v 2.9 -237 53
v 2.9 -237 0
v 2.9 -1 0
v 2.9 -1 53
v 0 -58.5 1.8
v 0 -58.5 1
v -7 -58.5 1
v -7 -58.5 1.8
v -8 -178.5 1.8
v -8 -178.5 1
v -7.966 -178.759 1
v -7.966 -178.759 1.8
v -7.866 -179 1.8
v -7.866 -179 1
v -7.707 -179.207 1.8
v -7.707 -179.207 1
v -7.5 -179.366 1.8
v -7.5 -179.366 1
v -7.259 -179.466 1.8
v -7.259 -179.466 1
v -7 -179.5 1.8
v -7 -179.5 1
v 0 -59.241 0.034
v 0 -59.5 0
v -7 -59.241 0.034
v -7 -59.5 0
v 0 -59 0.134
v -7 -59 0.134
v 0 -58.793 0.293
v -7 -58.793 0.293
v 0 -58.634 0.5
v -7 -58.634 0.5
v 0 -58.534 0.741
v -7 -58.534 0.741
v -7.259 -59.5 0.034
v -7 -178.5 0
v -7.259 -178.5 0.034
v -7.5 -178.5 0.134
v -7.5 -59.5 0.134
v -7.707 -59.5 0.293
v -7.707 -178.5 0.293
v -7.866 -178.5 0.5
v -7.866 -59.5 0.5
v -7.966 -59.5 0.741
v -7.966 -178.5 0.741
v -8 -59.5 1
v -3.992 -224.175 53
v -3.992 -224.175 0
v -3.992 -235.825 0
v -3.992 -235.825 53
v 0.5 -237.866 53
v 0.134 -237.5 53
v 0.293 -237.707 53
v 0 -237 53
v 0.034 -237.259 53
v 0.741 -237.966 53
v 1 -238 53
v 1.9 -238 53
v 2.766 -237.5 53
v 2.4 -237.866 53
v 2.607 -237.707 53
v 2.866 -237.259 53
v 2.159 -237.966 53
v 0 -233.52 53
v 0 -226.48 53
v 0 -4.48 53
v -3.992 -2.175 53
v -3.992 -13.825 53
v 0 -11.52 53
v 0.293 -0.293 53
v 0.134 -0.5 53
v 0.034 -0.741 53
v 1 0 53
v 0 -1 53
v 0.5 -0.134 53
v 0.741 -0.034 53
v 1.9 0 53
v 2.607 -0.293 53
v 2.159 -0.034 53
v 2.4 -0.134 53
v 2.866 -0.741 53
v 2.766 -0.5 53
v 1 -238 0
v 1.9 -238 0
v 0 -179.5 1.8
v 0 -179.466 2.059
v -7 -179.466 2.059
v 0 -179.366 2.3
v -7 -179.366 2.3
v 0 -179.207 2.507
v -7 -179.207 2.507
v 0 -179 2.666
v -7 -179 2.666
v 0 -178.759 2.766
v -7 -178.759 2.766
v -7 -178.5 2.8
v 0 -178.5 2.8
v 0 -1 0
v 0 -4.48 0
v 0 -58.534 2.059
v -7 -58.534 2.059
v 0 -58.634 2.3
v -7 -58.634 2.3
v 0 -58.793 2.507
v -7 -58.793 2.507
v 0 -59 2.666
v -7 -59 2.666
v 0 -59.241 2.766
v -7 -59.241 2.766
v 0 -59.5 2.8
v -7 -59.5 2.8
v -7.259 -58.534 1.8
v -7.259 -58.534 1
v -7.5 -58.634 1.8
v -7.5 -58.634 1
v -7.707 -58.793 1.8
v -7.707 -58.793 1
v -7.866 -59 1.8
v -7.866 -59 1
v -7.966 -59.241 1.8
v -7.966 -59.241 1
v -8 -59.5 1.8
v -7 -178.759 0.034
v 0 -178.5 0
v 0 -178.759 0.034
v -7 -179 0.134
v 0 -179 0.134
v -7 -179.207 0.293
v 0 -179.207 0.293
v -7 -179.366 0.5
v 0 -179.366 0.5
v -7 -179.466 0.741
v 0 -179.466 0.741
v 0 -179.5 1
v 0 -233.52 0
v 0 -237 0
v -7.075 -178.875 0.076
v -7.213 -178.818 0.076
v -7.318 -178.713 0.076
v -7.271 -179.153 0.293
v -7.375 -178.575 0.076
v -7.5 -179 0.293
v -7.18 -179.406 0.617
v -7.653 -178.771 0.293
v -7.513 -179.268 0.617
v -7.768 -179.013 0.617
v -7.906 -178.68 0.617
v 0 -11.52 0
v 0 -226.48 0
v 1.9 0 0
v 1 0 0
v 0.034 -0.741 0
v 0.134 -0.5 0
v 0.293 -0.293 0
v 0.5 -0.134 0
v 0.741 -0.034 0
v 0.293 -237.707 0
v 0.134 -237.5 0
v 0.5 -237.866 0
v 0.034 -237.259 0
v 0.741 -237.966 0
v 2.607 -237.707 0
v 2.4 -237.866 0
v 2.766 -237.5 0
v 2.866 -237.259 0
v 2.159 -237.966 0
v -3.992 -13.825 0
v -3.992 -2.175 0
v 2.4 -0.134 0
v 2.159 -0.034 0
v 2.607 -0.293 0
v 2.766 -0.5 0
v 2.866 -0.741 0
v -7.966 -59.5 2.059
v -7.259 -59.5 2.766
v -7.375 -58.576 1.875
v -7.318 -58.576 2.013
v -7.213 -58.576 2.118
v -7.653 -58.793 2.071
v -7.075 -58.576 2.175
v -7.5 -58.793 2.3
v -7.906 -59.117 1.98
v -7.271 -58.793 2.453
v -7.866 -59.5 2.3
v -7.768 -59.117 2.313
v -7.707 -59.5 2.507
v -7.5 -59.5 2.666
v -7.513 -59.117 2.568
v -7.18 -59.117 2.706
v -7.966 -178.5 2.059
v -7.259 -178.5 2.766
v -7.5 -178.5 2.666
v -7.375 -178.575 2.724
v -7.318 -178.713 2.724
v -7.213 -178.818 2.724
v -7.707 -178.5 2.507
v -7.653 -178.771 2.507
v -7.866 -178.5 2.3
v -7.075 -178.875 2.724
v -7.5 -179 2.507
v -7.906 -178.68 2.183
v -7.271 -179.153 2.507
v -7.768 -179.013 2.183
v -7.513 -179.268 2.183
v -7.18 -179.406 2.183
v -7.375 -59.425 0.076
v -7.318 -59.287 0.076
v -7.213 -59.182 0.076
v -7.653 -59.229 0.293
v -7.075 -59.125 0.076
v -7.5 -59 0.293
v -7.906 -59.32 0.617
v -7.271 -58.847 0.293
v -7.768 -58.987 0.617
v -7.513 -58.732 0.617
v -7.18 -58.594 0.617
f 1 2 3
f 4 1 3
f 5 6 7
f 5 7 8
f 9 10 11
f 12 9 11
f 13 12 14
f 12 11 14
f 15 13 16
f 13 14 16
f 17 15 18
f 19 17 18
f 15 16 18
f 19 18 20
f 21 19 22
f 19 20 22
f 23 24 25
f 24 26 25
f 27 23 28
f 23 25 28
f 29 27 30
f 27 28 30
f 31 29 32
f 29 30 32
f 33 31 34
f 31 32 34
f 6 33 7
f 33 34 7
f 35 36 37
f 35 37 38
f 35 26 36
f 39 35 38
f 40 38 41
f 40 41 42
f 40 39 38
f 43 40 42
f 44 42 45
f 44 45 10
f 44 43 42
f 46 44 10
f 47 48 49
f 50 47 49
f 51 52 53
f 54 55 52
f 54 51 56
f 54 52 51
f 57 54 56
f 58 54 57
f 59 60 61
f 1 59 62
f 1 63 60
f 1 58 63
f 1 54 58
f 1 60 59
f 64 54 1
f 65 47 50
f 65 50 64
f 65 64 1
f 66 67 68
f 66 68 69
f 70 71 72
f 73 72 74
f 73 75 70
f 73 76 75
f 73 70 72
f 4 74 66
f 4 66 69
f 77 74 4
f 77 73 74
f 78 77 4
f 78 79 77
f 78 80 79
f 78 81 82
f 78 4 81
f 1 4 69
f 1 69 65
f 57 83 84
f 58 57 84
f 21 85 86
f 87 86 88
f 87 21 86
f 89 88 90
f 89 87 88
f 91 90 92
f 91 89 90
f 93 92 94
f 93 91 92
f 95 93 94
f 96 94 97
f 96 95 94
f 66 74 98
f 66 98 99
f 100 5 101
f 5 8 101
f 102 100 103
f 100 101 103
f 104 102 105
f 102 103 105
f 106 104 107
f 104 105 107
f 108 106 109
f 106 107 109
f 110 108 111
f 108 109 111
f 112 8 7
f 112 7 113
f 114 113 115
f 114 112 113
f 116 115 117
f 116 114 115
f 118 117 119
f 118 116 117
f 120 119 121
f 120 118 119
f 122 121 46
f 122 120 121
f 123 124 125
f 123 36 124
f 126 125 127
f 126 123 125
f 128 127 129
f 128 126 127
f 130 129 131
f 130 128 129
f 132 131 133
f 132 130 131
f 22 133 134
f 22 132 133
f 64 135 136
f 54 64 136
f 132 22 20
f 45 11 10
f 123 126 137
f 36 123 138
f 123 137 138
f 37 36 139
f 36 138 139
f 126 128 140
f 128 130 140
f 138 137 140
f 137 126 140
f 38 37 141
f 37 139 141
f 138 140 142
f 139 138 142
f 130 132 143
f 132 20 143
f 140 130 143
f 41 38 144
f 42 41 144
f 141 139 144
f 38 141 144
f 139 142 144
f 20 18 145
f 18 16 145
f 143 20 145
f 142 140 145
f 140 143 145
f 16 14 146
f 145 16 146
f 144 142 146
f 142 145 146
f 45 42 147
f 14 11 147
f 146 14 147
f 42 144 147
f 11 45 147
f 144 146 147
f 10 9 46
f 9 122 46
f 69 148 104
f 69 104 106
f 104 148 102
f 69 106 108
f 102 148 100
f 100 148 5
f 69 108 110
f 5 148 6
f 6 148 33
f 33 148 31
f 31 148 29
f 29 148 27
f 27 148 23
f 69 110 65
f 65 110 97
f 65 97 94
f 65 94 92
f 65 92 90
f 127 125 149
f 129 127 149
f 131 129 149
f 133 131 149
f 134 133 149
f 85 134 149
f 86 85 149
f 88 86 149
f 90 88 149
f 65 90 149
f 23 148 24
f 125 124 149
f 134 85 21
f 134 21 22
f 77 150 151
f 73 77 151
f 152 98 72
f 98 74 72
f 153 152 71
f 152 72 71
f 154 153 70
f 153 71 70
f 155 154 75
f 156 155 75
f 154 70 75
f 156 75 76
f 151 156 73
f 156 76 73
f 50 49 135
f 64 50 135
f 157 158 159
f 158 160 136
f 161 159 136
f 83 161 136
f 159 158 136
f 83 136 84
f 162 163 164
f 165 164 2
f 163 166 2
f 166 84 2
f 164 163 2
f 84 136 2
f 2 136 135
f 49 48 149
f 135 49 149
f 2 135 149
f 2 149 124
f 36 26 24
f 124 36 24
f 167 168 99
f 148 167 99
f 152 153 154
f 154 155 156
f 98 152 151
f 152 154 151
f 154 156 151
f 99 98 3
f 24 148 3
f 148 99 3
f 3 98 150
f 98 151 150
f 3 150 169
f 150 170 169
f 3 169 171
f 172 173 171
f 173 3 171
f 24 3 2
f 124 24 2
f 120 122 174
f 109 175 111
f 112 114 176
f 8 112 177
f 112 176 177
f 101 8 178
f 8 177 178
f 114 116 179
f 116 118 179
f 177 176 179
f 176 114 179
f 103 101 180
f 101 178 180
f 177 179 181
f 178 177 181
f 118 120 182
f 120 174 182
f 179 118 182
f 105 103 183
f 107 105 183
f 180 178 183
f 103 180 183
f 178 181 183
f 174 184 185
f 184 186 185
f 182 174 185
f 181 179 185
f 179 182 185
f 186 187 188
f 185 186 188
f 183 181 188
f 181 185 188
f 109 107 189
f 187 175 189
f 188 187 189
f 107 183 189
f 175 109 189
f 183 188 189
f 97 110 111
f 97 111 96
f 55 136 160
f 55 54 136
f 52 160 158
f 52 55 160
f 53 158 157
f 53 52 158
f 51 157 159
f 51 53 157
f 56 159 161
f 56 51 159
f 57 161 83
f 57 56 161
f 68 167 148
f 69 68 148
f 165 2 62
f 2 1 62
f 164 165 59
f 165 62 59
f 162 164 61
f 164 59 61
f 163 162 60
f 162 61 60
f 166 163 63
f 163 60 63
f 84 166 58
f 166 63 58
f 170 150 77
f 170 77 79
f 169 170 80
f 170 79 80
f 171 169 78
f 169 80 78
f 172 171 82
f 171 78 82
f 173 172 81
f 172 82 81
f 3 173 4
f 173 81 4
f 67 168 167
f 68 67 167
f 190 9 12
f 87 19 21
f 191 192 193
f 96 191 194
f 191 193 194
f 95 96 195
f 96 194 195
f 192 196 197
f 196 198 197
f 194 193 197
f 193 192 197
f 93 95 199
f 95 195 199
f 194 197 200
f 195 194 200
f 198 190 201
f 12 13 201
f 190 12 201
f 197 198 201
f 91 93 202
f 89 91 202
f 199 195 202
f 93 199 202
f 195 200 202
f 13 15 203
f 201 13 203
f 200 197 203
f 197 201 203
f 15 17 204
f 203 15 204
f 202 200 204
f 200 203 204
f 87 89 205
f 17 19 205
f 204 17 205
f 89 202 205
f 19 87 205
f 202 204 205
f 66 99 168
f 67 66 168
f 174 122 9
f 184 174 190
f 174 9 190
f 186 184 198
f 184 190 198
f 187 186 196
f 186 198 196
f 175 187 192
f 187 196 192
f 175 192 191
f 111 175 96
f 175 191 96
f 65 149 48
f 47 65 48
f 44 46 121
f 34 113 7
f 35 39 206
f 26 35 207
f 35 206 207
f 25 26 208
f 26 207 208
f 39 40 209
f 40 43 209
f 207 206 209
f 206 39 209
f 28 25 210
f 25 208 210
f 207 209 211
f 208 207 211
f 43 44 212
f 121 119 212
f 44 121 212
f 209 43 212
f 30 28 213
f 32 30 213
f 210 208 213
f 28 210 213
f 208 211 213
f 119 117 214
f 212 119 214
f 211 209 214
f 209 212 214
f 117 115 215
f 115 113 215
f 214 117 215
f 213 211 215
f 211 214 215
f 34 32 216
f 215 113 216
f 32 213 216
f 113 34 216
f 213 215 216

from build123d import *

# Parameters (mm, degrees)
BOSS_EXTRUDE1_DEPTH = 53
BOSS_EXTRUDE2_DEPTH = 8
FILLET2_R           = 1
FILLET3_R           = 1


with BuildPart() as part:
    # Sketch2 → Boss-Extrude1 (new body)
    with BuildSketch(Plane.XY):
        Polygon((0, 0), (0, -4.48), (-3.992377111, -2.175), (-3.992377111, -13.825), (0, -11.52), (0, -19), (0, -219), (0, -226.48), (-3.992377111, -224.175), (-3.992377111, -235.825), (0, -233.52), (0, -238), (2.9, -238), (2.9, -230.541230437), (2.9, -7.458769563), (2.9, 0), align=None)
    extrude(amount=BOSS_EXTRUDE1_DEPTH)

    # Sketch3 → Boss-Extrude2 (add)
    with BuildSketch(Plane(origin=(0, 0, 0), x_dir=(0, 0, -1), z_dir=(1, 0, 0))):
        Polygon((0, -119), (0, -58.5), (-2.8, -58.5), (-2.8, -179.5), (0, -179.5), align=None)
    extrude(amount=-BOSS_EXTRUDE2_DEPTH)

    # Fillet2
    fillet2_edges = [part.edges().sort_by_distance(p)[0] for p in [
        (2.9, 0, 26.5),
        (2.9, -238, 26.5),
        (0, -238, 26.5),
        (0, 0, 26.5),
    ]]
    fillet(fillet2_edges, radius=FILLET2_R)

    # Fillet3
    fillet3_edges = [part.edges().sort_by_distance(p)[0] for p in [
        (-8, -179.5, 1.4),
        (-4, -179.5, 0),
        (-8, -119, 2.8),
        (-4, -179.5, 2.8),
        (-8, -58.5, 1.4),
        (-4, -58.5, 2.8),
        (-8, -119, 0),
        (-4, -58.5, 0),
    ]]
    fillet(fillet3_edges, radius=FILLET3_R)


solid = part.part
